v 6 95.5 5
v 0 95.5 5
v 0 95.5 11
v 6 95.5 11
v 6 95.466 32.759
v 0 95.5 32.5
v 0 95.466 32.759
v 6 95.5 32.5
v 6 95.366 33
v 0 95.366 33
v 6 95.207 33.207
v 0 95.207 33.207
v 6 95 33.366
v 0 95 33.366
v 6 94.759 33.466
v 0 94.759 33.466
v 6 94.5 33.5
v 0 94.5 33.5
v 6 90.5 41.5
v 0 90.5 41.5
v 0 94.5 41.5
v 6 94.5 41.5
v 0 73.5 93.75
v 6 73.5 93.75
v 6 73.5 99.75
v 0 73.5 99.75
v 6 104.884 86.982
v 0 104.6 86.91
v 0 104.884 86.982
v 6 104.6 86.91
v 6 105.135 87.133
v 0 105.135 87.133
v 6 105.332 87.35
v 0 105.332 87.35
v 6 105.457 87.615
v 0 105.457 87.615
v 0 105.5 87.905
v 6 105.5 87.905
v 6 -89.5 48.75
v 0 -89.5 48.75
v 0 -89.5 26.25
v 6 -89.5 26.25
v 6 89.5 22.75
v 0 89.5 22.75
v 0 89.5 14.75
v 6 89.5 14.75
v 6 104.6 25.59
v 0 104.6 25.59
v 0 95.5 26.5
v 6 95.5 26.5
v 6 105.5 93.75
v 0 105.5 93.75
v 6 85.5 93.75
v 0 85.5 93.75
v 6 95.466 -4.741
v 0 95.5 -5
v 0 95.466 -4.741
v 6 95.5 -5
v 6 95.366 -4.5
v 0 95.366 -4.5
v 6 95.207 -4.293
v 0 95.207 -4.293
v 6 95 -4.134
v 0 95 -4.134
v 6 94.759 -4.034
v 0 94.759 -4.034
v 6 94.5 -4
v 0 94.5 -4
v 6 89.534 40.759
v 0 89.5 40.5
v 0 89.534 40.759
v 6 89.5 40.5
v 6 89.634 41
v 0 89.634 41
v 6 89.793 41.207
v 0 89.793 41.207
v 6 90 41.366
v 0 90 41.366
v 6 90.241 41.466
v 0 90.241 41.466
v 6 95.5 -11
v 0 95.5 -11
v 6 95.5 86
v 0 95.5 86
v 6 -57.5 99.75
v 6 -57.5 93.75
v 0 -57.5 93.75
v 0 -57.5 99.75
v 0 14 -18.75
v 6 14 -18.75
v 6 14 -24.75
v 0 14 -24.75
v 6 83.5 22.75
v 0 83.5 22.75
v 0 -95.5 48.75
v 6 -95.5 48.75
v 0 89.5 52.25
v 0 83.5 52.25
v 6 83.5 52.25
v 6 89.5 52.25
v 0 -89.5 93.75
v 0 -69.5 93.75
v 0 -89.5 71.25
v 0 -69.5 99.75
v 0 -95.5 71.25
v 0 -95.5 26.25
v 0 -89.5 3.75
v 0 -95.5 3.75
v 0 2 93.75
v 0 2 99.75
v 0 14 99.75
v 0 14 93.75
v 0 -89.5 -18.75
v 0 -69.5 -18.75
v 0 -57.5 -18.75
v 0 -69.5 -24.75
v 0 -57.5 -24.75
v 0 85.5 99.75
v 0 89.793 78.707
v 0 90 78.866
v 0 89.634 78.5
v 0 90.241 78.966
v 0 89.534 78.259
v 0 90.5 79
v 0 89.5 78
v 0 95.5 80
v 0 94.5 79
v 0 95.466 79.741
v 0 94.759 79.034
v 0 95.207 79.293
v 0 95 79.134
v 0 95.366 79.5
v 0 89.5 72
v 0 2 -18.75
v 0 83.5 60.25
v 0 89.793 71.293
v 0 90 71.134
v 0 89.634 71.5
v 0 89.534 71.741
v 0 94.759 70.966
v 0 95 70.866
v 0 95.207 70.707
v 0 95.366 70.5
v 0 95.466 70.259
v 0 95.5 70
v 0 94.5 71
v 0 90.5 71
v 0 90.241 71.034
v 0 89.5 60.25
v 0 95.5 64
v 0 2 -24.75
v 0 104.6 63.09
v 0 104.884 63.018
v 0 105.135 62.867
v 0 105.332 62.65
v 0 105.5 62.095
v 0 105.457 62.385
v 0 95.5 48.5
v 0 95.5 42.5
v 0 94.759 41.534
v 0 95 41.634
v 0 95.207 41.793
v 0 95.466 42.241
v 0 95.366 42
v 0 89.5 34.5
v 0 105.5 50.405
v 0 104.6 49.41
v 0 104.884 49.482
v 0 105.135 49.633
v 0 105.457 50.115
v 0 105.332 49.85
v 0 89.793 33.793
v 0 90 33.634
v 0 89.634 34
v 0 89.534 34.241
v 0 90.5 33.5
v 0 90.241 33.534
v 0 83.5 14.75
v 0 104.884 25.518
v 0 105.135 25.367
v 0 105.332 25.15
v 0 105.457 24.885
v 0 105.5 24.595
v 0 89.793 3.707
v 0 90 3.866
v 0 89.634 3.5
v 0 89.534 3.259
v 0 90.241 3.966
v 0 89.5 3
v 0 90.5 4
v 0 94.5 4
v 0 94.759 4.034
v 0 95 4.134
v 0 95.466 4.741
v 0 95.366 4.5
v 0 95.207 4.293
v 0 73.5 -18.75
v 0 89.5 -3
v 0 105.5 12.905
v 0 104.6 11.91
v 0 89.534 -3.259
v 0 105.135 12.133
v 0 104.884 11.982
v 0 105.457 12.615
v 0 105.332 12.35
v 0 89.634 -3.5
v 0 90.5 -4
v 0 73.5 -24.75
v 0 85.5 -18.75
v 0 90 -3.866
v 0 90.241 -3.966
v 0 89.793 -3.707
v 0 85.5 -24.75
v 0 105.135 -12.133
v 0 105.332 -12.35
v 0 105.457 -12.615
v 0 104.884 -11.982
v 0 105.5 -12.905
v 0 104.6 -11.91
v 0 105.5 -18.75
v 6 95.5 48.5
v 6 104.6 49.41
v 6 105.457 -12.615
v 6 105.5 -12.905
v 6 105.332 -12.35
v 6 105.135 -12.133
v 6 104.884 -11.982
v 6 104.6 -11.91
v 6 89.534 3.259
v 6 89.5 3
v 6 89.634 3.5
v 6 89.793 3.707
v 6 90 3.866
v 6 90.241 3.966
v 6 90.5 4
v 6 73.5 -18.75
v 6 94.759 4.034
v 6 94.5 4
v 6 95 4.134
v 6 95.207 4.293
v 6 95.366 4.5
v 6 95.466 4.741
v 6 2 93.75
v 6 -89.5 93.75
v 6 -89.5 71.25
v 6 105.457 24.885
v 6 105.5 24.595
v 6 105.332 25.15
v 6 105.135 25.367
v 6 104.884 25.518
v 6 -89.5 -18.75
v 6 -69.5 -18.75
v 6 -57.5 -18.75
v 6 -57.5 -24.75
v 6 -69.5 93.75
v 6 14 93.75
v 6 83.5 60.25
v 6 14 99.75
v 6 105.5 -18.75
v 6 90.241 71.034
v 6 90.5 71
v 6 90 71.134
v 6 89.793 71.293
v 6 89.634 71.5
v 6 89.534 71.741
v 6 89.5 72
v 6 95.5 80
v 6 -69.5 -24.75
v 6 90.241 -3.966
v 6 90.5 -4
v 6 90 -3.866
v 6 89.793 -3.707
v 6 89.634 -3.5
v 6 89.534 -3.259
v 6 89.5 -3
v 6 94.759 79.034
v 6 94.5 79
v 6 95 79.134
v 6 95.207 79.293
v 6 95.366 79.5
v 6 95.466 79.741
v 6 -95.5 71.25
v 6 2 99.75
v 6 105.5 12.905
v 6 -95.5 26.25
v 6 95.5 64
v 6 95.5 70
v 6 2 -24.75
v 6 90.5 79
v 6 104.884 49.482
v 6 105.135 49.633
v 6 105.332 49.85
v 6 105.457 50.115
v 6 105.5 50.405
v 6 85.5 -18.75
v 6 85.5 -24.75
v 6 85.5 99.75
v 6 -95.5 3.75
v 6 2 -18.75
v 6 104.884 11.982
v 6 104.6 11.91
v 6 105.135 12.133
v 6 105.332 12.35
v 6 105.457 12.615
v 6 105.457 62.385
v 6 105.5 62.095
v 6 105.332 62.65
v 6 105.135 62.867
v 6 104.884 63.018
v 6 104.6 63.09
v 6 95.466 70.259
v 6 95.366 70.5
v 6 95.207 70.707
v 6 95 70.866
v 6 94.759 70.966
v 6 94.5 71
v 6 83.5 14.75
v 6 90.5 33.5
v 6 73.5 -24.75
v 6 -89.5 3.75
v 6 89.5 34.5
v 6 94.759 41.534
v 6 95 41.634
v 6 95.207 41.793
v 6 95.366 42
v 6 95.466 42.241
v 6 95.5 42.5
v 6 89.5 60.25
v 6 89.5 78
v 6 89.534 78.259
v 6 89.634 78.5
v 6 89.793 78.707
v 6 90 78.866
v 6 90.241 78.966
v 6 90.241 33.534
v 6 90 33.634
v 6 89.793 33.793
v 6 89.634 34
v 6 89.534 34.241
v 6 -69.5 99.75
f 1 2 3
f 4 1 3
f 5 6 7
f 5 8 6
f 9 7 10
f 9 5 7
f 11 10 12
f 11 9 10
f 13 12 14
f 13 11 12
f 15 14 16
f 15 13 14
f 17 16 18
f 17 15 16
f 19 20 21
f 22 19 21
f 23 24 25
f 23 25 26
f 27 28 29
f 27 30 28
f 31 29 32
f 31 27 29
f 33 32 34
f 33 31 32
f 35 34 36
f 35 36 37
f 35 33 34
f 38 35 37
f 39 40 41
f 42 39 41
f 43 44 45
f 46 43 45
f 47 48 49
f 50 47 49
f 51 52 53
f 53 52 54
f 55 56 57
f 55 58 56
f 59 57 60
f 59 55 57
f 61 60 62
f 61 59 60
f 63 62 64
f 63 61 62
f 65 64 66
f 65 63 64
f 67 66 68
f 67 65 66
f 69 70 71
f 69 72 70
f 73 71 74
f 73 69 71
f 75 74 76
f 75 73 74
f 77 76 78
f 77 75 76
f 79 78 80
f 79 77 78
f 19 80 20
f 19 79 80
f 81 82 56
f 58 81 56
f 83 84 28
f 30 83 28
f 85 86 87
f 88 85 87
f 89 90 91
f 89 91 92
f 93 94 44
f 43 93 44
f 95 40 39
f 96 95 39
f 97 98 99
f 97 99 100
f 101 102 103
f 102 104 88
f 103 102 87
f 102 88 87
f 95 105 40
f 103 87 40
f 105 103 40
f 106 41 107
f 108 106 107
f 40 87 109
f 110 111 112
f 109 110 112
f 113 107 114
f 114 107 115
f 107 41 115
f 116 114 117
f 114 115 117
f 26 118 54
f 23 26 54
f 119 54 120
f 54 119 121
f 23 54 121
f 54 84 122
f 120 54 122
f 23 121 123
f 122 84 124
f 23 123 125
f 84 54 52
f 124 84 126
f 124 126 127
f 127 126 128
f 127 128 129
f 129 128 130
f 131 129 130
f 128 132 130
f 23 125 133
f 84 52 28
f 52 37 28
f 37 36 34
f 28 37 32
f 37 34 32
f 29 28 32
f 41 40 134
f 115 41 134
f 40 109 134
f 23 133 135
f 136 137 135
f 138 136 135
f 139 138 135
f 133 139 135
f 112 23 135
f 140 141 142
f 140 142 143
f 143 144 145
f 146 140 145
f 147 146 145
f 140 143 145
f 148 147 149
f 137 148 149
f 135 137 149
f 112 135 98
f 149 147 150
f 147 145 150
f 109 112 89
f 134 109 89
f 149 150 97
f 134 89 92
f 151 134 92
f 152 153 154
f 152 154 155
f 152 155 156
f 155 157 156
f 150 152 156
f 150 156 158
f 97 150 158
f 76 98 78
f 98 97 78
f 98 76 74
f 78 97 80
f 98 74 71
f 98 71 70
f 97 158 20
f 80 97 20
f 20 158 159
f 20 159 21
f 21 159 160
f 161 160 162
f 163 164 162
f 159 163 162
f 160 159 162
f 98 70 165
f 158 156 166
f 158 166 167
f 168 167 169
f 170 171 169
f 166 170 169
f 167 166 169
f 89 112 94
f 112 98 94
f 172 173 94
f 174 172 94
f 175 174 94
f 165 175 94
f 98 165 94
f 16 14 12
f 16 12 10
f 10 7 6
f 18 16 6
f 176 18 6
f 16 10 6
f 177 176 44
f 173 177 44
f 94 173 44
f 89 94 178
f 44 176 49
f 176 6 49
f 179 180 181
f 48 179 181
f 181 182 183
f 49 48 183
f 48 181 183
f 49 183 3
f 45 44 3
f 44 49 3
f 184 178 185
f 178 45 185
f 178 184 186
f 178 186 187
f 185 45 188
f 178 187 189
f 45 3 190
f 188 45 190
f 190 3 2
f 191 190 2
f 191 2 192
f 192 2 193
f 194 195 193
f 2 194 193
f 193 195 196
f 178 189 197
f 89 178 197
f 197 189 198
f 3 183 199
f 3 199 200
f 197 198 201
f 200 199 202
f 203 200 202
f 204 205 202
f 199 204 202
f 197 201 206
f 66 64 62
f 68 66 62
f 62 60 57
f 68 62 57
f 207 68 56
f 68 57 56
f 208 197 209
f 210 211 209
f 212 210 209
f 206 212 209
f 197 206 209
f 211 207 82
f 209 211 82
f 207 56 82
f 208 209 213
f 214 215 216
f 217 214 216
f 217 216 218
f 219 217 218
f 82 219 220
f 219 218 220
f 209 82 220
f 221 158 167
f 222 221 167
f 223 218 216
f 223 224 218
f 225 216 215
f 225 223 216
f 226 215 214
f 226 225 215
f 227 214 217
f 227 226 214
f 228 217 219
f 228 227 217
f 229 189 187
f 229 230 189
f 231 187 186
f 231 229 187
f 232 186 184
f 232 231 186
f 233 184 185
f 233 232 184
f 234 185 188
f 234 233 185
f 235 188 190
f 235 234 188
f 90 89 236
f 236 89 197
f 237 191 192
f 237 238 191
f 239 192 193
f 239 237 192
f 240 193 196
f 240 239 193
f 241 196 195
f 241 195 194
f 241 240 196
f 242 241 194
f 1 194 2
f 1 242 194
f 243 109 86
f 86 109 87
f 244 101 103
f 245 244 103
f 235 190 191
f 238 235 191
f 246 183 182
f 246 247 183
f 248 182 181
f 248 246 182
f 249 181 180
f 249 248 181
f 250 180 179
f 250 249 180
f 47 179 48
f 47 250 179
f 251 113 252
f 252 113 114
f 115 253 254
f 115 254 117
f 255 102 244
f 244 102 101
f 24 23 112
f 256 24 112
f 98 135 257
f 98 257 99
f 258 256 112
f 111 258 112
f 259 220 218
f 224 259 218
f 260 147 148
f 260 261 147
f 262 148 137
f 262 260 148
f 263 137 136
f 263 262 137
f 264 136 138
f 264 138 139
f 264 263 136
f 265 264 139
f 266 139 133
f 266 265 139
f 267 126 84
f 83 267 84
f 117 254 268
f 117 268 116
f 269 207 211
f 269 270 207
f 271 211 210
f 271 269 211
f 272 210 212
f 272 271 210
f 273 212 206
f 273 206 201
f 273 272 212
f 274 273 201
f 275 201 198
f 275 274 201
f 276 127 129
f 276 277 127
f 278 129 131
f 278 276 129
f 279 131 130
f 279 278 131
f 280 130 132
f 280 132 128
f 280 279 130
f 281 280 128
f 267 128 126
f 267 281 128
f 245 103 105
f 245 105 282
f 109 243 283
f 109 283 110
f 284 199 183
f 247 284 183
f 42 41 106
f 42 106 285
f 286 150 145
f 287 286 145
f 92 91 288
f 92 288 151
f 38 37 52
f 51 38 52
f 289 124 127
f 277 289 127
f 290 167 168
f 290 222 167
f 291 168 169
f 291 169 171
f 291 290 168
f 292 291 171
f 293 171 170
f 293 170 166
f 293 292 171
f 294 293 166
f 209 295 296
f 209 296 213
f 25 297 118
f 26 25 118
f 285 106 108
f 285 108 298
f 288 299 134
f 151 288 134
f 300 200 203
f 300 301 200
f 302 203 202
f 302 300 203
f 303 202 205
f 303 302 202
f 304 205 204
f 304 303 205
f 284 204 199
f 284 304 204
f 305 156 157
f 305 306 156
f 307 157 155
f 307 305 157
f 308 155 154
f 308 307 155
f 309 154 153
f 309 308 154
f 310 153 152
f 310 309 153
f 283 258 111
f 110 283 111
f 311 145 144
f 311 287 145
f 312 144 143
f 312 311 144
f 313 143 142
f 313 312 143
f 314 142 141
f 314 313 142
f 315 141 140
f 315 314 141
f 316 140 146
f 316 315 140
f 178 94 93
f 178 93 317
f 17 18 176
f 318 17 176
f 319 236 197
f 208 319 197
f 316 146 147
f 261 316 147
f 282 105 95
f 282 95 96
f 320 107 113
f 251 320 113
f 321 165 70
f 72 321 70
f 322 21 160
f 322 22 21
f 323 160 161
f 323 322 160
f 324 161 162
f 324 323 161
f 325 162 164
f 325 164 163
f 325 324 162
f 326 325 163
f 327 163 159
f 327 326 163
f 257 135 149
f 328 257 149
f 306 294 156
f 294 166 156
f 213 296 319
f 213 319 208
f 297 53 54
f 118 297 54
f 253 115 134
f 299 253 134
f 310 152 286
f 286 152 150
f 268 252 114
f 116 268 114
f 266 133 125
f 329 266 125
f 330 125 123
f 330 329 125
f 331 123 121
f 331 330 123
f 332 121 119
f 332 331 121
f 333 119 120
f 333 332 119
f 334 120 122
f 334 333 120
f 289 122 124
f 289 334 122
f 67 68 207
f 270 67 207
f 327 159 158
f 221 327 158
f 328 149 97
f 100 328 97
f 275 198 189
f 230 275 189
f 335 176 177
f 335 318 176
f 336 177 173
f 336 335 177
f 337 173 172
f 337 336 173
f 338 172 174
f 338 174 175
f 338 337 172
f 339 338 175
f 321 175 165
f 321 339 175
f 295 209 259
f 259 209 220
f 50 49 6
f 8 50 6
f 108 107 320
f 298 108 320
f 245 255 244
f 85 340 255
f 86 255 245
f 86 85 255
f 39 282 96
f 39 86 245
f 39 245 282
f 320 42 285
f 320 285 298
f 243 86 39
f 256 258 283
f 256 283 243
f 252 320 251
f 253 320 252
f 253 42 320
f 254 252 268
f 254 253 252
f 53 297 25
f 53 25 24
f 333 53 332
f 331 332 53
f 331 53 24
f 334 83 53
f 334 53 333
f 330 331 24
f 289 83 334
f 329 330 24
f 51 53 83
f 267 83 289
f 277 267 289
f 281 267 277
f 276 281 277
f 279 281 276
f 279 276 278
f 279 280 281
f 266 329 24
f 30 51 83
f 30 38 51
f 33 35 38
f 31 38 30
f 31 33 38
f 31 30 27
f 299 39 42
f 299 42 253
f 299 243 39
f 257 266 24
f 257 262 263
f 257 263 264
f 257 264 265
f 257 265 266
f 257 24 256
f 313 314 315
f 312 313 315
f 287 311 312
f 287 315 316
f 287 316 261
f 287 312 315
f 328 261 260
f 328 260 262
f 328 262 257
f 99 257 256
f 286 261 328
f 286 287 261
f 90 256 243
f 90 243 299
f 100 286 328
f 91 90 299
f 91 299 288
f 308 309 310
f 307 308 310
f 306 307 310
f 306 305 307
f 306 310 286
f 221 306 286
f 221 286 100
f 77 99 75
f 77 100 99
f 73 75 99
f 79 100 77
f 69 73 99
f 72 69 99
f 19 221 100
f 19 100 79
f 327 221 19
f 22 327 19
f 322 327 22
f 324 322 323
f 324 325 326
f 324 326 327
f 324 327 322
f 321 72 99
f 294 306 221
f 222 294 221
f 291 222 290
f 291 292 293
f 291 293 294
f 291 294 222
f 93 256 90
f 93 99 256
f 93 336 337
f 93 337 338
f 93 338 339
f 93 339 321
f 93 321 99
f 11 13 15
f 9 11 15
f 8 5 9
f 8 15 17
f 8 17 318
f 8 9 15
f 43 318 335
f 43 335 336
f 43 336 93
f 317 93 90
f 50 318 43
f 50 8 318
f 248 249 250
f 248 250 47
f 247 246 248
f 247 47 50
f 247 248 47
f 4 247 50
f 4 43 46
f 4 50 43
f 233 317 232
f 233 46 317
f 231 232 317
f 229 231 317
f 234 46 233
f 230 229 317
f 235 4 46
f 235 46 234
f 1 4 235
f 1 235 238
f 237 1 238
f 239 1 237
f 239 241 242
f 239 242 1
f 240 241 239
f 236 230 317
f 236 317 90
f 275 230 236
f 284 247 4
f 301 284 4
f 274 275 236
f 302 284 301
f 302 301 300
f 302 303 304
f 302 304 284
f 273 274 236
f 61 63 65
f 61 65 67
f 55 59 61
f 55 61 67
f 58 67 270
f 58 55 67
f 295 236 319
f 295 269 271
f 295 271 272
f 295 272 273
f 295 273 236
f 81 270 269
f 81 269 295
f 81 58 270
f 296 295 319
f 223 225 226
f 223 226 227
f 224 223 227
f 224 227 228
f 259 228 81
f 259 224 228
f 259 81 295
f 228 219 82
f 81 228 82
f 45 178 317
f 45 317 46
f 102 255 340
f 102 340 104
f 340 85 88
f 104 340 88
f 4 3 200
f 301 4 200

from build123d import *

# Parameters (mm, degrees)
BOSS_EXTRUDE2_DEPTH    = 6
FILLET1_R              = 1
LPATTERN1_COUNT        = 3
LPATTERN1_PITCH        = 37.5
FILLET1_OF_LPATTERN1_R = 1
SKETCH3_W              = 6
SKETCH3_H              = 12
BOSS_EXTRUDE3_DEPTH    = 6
SKETCH4_W              = 8
SKETCH4_H              = 6
CUT_EXTRUDE2_DEPTH     = 7
LPATTERN2_COUNT        = 2
LPATTERN2_PITCH        = 37.5
BOSS_EXTRUDE4_START    = -112.5
SKETCH3_2_W            = 6
SKETCH3_2_H            = 12
BOSS_EXTRUDE4_DEPTH    = 6
SKETCH5_W              = 6
SKETCH5_H              = 22.5
BOSS_EXTRUDE5_DEPTH    = 6


with BuildPart() as part:
    # Sketch2 → Boss-Extrude2 (new body)
    with BuildSketch(Plane(origin=(0, 0, 0), x_dir=(0, 0, -1), z_dir=(1, 0, 0))):
        Polygon((-18.75, 105.5), (-18.75, 89.5), (-18.75, -89.5), (18.75, -89.5), (18.75, 89.5), (18.75, 105.5), (12, 105.5), (11, 95.5), (4, 95.5), (4, 89.5), (-4, 89.5), (-4, 95.5), (-11, 95.5), (-12, 105.5), align=None)
    boss_extrude2 = extrude(amount=BOSS_EXTRUDE2_DEPTH)

    # Fillet1
    fillet1_edges = [part.edges().sort_by_distance(p)[0] for p in [
        (3, 95.5, -4),
        (3, 105.5, -12),
        (3, 105.5, 12),
        (3, 95.5, 4),
        (3, 89.5, 4),
        (3, 89.5, -4),
    ]]
    fillet(fillet1_edges, radius=FILLET1_R)

    # LPattern1: Boss-Extrude2 ×3
    with Locations(*[(0, 0, i * LPATTERN1_PITCH) for i in range(1, LPATTERN1_COUNT)]):
        add(boss_extrude2)

    # Fillet1 of LPattern1
    fillet1_of_lpattern1_edges = [part.edges().sort_by_distance(p)[0] for p in [
        (3, 95.5, 33.5),
        (3, 105.5, 25.5),
        (3, 105.5, 49.5),
        (3, 95.5, 41.5),
        (3, 89.5, 41.5),
        (3, 89.5, 33.5),
        (3, 95.5, 71),
        (3, 105.5, 63),
        (3, 105.5, 87),
        (3, 95.5, 79),
        (3, 89.5, 79),
        (3, 89.5, 71),
    ]]
    fillet(fillet1_of_lpattern1_edges, radius=FILLET1_OF_LPATTERN1_R)

    # Sketch3 → Boss-Extrude3 (add)
    with BuildSketch(Plane(origin=(0, 0, -18.75), x_dir=(-1, 0, 0), z_dir=(0, 0, -1))):
        with Locations((-3, 79.5)):
            Rectangle(SKETCH3_W, SKETCH3_H)
        with Locations((-3, -63.5)):
            Rectangle(SKETCH3_W, SKETCH3_H)
        with Locations((-3, 8)):
            Rectangle(SKETCH3_W, SKETCH3_H)
    extrude(amount=BOSS_EXTRUDE3_DEPTH)

    # Sketch4 → Cut-Extrude2 (cut, through all)
    with BuildSketch(Plane(origin=(0, 0, 0), x_dir=(0, 0, -1), z_dir=(1, 0, 0))):
        with Locations((-18.75, 86.5)):
            Rectangle(SKETCH4_W, SKETCH4_H)
    cut_extrude2 = extrude(amount=CUT_EXTRUDE2_DEPTH, mode=Mode.SUBTRACT)

    # LPattern2: Cut-Extrude2 ×2
    with Locations(*[(0, 0, i * LPATTERN2_PITCH) for i in range(1, LPATTERN2_COUNT)]):
        add(cut_extrude2, mode=Mode.SUBTRACT)

    # Sketch3_2 → Boss-Extrude4 (add)
    with BuildSketch(Plane(origin=(0, 0, -18.75), x_dir=(-1, 0, 0), z_dir=(0, 0, -1)).offset(BOSS_EXTRUDE4_START)):
        with Locations((-3, 79.5)):
            Rectangle(SKETCH3_2_W, SKETCH3_2_H)
        with Locations((-3, -63.5)):
            Rectangle(SKETCH3_2_W, SKETCH3_2_H)
        with Locations((-3, 8)):
            Rectangle(SKETCH3_2_W, SKETCH3_2_H)
    extrude(amount=-BOSS_EXTRUDE4_DEPTH)

    # Sketch5 → Boss-Extrude5 (add)
    with BuildSketch(Plane.XZ.offset(89.5)):
        with Locations((3, 15)):
            Rectangle(SKETCH5_W, SKETCH5_H)
        with Locations((3, 60)):
            Rectangle(SKETCH5_W, SKETCH5_H)
    extrude(amount=BOSS_EXTRUDE5_DEPTH)


solid = part.part
